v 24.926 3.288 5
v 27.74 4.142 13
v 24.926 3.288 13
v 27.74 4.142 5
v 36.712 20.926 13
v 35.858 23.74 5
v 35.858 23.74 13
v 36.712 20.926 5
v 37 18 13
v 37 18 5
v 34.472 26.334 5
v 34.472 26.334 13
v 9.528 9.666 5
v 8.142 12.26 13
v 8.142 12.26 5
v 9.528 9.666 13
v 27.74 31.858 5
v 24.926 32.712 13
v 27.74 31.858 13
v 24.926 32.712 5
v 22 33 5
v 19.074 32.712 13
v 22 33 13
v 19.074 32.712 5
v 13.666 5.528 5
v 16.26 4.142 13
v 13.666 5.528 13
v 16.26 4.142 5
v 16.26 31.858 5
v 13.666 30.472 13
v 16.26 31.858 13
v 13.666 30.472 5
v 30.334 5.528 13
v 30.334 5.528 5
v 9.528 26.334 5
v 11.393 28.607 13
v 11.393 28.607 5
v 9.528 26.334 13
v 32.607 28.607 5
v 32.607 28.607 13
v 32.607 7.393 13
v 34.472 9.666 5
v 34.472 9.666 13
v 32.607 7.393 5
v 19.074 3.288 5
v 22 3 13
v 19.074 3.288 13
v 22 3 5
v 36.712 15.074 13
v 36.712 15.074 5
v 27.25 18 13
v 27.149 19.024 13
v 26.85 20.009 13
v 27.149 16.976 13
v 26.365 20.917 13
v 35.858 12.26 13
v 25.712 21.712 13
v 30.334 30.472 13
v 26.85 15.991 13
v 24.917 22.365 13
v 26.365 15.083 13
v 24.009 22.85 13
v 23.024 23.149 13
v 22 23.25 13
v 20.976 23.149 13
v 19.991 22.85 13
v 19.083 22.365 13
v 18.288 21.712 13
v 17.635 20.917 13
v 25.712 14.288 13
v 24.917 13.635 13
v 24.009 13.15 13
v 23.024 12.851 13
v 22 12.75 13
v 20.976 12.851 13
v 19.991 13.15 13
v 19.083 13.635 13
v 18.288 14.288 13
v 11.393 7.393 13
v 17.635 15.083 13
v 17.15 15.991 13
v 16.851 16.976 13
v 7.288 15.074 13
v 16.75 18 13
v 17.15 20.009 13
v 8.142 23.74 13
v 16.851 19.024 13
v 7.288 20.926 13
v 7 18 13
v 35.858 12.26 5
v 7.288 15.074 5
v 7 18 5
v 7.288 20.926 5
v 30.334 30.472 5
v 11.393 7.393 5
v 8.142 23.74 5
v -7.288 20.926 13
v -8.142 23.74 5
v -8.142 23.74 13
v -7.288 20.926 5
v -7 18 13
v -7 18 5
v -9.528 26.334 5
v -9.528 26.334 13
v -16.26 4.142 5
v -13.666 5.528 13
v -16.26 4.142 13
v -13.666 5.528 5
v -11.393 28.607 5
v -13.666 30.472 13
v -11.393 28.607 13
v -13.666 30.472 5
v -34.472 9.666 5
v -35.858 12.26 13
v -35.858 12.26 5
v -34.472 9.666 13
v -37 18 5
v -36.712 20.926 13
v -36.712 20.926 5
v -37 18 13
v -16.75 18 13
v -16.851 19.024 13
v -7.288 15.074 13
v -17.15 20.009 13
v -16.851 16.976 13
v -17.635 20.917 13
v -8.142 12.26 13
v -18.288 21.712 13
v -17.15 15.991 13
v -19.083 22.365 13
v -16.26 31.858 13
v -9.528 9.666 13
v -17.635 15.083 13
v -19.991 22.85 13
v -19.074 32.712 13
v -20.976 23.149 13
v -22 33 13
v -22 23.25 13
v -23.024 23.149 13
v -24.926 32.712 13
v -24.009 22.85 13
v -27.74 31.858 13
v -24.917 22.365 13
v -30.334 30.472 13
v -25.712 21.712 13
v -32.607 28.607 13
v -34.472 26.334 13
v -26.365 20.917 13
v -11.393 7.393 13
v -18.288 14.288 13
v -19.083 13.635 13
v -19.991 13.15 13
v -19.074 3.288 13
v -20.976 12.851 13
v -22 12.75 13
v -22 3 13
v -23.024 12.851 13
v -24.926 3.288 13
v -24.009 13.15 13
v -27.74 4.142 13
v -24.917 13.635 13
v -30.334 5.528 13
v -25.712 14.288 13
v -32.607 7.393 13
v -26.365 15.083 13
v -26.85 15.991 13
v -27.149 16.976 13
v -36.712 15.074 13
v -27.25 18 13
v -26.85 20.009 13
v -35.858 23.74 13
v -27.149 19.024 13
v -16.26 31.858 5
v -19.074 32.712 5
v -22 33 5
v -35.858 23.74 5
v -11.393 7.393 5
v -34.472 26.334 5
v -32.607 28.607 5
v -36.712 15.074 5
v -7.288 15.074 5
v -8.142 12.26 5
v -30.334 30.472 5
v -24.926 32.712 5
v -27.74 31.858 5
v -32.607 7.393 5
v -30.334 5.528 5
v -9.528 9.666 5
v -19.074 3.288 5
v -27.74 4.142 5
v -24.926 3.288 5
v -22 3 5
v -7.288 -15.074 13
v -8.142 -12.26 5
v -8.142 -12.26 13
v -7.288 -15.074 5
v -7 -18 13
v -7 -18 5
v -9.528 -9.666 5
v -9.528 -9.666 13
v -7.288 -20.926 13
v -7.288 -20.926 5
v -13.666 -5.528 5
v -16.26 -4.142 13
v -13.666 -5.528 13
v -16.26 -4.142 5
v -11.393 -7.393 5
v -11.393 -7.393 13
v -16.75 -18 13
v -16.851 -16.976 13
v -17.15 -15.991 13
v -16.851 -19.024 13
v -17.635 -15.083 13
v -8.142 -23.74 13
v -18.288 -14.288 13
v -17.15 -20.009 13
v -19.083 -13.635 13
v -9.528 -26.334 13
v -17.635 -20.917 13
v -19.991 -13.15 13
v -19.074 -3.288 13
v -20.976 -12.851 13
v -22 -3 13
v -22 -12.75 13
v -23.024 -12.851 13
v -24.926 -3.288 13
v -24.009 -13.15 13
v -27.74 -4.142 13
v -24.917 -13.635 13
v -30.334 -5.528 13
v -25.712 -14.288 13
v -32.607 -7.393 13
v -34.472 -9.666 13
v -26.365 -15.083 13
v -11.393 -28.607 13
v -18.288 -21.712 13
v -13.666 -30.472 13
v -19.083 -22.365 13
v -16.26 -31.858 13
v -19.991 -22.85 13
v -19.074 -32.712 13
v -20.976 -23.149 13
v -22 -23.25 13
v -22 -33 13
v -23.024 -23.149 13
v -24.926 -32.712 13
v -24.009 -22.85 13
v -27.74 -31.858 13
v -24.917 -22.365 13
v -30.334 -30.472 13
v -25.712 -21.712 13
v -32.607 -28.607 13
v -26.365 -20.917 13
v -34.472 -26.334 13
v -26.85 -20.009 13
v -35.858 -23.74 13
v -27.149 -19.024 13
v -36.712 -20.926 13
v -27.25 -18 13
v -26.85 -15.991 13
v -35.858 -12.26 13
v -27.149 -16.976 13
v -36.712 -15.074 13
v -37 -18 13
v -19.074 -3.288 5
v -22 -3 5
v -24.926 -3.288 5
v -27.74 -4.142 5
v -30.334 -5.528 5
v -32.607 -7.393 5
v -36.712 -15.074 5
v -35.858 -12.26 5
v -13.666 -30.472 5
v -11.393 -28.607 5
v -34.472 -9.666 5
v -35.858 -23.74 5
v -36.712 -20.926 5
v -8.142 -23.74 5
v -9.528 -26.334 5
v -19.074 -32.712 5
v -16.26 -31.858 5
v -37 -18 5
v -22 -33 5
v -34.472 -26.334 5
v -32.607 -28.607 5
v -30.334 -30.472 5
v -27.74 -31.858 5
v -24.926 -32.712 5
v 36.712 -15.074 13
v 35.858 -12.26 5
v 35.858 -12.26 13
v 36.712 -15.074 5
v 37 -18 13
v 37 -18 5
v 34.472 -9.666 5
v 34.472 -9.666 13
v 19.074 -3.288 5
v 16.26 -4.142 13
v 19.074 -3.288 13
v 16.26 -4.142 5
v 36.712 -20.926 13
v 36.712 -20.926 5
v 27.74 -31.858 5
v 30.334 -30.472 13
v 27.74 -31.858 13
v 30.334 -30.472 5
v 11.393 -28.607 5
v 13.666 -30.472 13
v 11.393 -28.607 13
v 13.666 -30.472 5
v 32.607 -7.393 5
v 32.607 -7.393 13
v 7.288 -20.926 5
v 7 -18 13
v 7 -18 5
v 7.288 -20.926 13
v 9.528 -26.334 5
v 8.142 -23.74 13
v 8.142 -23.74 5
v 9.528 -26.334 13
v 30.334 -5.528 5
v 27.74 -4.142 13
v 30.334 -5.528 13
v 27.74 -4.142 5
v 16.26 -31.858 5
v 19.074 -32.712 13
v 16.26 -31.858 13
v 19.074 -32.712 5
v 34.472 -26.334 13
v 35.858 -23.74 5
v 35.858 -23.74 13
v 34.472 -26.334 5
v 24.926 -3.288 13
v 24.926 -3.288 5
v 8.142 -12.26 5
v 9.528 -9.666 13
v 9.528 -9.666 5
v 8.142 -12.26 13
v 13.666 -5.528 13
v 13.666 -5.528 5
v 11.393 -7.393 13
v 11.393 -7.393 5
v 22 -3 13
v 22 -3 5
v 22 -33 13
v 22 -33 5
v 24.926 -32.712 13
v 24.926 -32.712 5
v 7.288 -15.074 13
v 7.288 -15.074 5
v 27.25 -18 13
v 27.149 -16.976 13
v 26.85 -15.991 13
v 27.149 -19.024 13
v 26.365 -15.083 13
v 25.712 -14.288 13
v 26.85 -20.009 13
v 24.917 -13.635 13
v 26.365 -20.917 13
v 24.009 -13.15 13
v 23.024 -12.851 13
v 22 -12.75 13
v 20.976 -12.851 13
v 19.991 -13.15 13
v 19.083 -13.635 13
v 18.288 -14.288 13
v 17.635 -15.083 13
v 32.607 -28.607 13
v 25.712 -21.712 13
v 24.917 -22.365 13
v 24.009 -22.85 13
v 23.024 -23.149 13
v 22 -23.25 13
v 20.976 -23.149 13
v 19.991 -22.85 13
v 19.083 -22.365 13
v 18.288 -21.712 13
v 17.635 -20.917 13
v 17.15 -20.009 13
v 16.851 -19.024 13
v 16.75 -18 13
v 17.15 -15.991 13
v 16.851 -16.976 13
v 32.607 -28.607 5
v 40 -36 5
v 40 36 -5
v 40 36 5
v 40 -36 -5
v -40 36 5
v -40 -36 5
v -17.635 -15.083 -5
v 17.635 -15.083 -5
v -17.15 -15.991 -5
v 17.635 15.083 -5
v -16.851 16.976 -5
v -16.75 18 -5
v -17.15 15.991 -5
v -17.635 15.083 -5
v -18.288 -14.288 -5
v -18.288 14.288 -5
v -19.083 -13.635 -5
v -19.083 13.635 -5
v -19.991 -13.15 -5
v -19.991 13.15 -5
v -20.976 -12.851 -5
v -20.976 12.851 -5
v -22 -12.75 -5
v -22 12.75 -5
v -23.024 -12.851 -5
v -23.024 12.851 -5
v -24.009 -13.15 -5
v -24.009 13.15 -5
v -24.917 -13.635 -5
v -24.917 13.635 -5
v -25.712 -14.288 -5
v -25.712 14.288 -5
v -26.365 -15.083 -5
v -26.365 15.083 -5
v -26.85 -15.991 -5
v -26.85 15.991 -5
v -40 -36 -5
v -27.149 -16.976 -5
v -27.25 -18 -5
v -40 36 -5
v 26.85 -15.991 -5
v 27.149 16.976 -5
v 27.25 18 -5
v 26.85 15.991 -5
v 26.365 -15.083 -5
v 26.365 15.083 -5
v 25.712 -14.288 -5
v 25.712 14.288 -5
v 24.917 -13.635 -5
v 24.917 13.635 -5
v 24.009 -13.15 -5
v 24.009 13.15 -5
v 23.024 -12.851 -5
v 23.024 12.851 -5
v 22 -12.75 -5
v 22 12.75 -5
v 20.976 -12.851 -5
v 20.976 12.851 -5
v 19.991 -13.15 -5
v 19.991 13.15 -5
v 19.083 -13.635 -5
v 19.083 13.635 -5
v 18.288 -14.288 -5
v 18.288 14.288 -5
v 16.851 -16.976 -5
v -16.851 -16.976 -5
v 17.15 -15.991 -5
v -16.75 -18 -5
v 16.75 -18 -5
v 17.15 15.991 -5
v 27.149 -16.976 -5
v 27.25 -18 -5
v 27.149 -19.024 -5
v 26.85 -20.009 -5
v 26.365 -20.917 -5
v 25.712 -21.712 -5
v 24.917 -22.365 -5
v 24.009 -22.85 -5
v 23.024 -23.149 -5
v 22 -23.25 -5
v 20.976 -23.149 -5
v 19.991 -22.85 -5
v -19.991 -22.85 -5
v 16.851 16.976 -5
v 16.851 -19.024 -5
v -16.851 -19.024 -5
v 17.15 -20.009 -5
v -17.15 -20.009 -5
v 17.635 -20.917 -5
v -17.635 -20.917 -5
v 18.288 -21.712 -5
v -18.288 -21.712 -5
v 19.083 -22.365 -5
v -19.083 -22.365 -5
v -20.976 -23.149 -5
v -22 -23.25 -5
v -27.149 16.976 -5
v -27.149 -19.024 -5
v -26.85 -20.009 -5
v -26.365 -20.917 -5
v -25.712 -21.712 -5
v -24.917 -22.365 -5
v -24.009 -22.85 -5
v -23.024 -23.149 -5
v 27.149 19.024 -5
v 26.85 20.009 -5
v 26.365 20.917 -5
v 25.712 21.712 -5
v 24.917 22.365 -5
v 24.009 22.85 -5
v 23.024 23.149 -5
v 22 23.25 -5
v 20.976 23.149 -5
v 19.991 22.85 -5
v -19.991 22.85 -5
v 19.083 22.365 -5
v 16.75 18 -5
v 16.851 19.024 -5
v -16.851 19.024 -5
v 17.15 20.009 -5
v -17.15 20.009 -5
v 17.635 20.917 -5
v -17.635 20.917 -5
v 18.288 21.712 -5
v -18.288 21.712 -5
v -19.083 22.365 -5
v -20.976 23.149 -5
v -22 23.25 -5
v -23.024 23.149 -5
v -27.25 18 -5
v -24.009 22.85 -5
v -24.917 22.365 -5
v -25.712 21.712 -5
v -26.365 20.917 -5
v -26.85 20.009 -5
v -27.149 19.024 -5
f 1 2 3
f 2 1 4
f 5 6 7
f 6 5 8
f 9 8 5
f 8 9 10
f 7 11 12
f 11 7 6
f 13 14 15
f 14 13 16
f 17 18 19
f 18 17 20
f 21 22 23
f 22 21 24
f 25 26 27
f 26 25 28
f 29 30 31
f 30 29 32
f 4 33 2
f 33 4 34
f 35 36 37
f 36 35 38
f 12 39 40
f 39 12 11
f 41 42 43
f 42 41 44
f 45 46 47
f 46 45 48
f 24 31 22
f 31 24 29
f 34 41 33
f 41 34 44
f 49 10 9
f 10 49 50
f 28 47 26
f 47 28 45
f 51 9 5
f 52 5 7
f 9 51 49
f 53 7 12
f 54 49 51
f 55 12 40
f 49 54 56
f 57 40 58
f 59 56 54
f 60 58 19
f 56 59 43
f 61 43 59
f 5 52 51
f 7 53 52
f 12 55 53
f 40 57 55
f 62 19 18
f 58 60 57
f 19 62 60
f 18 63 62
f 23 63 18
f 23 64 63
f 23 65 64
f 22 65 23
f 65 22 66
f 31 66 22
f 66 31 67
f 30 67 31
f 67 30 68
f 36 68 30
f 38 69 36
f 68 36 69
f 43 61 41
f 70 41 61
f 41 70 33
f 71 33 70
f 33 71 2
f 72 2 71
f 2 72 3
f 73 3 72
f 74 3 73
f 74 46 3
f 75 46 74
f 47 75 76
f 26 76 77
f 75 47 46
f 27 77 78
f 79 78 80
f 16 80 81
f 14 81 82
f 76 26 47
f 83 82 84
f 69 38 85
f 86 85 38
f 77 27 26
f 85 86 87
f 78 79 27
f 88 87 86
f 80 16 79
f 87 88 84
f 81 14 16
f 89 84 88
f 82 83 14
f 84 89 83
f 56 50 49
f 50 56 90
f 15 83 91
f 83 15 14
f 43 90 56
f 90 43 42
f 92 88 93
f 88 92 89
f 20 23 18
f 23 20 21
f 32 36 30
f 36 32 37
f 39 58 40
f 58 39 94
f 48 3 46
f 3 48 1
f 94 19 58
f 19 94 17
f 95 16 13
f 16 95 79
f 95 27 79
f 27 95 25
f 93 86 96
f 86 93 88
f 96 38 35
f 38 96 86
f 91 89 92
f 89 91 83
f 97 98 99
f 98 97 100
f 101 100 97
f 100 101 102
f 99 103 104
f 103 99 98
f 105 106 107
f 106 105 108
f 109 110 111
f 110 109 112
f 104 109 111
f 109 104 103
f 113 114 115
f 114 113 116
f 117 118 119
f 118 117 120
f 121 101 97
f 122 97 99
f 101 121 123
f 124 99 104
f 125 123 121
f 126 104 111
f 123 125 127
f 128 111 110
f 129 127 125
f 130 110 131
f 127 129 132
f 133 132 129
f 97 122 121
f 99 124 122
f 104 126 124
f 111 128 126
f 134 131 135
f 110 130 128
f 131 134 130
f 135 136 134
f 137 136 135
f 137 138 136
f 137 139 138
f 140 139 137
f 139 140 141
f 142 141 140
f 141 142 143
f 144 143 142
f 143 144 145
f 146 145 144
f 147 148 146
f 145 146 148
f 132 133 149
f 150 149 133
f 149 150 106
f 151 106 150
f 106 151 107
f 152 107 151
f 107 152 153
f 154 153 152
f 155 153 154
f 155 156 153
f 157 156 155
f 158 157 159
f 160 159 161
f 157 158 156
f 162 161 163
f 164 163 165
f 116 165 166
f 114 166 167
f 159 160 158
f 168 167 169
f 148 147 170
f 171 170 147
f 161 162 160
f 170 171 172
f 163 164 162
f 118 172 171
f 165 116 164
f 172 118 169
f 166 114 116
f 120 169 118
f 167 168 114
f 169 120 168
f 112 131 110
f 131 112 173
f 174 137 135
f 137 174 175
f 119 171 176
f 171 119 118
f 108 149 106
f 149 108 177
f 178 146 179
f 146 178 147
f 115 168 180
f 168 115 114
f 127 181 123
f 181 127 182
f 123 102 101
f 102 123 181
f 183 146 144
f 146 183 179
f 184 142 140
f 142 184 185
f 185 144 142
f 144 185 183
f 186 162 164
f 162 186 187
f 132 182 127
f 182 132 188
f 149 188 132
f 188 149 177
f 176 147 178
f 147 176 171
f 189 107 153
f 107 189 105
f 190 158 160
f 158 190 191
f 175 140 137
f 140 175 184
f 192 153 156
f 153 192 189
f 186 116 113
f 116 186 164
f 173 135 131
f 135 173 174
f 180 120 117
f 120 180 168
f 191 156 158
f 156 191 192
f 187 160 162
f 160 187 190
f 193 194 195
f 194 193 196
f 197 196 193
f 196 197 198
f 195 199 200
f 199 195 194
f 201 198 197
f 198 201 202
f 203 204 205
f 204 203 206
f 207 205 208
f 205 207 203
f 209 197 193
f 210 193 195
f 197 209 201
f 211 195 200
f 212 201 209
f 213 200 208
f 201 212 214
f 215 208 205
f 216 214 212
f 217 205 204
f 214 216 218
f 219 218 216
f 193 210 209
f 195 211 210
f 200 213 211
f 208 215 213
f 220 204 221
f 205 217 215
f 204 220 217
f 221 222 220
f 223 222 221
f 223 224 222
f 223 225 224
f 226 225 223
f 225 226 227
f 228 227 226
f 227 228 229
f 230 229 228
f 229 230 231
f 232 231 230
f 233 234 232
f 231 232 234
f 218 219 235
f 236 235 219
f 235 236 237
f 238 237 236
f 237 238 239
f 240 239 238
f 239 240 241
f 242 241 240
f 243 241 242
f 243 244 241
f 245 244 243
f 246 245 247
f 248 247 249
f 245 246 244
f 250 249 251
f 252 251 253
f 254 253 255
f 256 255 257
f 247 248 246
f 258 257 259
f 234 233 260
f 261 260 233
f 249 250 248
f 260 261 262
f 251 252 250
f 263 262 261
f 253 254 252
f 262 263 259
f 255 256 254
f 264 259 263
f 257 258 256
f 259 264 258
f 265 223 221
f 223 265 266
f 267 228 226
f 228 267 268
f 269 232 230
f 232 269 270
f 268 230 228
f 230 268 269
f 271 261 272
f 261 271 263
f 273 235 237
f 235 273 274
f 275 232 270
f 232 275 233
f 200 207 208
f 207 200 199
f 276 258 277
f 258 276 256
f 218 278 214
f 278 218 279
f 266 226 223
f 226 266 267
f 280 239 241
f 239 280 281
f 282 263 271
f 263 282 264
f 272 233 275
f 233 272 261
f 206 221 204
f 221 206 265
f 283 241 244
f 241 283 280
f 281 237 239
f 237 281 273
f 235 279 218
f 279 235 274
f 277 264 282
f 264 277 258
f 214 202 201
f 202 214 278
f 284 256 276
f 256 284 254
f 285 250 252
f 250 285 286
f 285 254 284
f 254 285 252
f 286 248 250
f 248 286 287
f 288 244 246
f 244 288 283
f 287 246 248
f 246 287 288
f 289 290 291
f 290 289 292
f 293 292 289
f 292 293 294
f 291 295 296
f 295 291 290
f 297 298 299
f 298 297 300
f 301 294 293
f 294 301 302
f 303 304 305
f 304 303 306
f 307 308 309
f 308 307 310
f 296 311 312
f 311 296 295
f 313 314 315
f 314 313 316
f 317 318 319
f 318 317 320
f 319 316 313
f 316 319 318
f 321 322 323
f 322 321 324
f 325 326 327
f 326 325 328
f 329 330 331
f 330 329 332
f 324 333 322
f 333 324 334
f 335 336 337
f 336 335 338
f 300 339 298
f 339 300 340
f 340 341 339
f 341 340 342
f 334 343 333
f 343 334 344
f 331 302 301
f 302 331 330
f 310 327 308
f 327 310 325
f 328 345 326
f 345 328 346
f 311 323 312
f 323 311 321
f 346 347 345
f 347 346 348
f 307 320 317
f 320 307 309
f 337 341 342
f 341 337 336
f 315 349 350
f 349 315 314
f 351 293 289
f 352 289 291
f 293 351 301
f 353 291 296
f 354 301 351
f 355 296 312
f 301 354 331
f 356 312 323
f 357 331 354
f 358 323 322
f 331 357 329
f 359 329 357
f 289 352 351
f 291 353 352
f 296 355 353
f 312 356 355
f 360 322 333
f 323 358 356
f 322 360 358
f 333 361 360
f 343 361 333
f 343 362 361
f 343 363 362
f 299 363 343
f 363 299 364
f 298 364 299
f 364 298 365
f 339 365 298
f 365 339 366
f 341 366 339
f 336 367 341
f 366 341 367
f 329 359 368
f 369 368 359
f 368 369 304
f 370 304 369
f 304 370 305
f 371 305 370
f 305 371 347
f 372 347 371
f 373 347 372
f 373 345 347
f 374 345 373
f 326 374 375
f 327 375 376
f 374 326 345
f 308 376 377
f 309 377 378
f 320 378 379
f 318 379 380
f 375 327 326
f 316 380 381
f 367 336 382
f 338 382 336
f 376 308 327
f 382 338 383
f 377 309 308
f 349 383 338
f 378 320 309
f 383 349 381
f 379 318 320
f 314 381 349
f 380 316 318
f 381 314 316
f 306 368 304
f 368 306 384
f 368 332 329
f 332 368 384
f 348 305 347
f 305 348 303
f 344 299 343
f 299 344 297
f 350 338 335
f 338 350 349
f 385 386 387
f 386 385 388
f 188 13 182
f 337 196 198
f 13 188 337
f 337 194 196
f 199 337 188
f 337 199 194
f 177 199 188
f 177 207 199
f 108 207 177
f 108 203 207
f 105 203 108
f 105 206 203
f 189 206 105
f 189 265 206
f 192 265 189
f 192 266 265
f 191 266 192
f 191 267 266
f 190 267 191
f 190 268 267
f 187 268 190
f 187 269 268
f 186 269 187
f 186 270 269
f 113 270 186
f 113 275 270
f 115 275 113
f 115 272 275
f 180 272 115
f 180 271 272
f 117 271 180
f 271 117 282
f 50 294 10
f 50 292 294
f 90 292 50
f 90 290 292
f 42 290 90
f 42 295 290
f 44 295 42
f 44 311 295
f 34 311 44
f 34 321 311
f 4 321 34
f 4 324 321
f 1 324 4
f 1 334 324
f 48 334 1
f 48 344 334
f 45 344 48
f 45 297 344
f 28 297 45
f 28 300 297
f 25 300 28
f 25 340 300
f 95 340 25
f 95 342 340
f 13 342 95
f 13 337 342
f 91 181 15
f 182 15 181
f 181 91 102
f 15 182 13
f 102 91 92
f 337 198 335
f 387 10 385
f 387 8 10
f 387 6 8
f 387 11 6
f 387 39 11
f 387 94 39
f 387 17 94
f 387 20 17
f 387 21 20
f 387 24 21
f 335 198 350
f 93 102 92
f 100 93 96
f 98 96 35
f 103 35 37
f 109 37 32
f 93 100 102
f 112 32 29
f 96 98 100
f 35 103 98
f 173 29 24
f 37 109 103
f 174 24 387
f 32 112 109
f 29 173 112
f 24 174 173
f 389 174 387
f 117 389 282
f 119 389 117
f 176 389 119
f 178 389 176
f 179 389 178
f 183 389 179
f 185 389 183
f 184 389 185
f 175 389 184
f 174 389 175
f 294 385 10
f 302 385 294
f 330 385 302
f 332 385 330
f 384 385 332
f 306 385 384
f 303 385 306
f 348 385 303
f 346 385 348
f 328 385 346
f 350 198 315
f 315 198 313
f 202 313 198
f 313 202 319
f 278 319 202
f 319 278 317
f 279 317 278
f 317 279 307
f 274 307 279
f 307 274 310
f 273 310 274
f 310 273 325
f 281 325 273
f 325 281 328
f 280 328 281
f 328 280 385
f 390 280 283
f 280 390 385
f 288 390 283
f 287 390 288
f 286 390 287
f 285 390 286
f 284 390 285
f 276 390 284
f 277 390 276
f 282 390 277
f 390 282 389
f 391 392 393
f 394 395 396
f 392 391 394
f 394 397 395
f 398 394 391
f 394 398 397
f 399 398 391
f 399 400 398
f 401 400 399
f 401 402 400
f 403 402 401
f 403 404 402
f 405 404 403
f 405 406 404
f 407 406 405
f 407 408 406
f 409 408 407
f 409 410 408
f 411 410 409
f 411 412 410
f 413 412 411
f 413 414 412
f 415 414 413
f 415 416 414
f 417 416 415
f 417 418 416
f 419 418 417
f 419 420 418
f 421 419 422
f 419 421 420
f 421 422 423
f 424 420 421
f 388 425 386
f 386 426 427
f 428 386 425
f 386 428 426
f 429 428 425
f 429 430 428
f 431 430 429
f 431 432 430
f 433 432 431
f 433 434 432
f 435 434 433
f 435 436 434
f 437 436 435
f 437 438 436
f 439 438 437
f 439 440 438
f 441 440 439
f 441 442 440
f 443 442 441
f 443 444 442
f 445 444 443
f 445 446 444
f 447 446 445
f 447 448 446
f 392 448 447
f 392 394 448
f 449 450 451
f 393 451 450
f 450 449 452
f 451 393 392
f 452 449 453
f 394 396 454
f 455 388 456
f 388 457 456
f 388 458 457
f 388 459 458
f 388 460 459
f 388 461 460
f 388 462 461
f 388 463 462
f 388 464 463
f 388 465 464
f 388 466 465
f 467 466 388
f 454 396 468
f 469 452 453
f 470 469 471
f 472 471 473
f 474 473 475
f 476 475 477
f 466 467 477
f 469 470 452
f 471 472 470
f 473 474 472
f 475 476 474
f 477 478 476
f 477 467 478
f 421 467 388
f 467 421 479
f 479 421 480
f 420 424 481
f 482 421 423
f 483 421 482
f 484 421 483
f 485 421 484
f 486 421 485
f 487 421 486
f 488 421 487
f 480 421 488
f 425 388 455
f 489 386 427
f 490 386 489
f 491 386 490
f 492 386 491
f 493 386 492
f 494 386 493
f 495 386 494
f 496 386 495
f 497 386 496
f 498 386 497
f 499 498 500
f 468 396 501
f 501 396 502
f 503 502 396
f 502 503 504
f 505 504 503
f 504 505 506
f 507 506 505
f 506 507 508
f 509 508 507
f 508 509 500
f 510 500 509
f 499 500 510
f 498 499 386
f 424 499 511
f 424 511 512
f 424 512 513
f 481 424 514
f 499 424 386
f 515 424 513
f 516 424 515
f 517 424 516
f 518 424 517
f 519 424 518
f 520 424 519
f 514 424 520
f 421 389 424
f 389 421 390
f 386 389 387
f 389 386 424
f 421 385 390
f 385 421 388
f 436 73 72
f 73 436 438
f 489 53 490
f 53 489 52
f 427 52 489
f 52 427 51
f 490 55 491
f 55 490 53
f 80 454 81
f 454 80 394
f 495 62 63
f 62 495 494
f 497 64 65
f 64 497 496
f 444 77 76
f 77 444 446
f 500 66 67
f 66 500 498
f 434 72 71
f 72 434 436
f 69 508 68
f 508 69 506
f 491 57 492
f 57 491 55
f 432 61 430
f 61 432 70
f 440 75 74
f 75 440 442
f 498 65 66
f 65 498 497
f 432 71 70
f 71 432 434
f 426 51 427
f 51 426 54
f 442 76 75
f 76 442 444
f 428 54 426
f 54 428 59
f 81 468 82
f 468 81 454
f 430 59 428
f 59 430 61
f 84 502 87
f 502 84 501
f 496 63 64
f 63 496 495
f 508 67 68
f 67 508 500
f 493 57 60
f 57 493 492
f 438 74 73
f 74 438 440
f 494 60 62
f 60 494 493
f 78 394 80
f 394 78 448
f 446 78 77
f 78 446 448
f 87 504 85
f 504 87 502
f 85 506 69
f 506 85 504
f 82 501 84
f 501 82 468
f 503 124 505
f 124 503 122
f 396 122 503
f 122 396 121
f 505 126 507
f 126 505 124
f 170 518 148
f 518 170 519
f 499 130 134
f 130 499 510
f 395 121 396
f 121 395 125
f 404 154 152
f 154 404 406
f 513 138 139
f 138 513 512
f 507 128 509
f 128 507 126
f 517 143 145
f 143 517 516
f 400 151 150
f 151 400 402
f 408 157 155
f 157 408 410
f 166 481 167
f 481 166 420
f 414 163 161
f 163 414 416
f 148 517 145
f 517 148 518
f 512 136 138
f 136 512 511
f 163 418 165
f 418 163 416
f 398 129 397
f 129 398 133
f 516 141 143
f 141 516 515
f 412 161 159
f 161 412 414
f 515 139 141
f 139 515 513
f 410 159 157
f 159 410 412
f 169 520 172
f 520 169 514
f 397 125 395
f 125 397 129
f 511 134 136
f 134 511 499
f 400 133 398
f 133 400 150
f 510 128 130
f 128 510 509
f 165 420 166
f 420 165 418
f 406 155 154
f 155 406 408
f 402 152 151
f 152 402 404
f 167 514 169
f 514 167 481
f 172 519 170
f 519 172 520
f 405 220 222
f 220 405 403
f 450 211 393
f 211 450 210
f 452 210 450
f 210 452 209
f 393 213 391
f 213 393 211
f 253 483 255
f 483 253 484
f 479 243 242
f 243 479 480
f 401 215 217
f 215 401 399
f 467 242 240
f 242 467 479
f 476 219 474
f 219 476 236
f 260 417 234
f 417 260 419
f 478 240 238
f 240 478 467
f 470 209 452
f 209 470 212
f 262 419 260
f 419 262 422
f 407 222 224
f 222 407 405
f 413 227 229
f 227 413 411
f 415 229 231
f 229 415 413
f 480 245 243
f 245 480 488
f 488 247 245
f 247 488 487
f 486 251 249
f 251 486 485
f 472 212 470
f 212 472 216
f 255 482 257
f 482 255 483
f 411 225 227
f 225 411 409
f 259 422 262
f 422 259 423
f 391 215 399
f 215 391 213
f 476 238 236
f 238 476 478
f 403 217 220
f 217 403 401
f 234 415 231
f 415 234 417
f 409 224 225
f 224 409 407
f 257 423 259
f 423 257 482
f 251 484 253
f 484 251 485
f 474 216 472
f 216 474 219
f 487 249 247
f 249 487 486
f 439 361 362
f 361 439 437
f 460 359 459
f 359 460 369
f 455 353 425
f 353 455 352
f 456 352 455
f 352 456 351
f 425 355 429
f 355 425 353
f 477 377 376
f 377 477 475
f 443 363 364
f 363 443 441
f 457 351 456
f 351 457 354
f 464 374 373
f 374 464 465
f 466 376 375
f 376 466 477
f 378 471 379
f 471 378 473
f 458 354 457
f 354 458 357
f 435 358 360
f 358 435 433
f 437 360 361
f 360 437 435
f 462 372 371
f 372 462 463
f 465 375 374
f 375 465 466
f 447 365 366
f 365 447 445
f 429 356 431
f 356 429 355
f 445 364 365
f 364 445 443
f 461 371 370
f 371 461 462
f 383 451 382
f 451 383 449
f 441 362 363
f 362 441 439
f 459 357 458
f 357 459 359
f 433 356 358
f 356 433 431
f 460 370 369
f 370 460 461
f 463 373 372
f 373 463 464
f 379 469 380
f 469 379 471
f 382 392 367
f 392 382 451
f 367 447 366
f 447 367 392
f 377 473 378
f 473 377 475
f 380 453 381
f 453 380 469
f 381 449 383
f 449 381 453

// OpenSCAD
$fn = 32;

// ----------------------------------------------------------------------
// Anchor pads 80 x 72 x 18
// four corner bosses with anchor holes
// ----------------------------------------------------------------------

// --- parameters (mm) ---
plate = [80, 72, 10];  // base plate size (x, y, z)
pads = 4;              // boss count, one per corner
edge = 18;             // boss centre offset from the plate edge
boss_d = 30;           // boss diameter
boss_h = 8;            // boss height above the base plate
hole_d = 10.5;         // hole diameter

// --- derived feature positions (mm) ---
height = plate[2] + boss_h;      // = 18   overall height of the part
corner_x = plate[0] / 2 - edge;  // = 22   boss centre X
corner_y = plate[1] / 2 - edge;  // = 18   boss centre Y
feature_centers = [
  [corner_x, corner_y],
  [-corner_x, corner_y],
  [-corner_x, -corner_y],
  [corner_x, -corner_y]
];   // boss centres, anchor holes are drilled there

// base plate, four bosses standing on it, anchor holes all the way through
difference() {
  union() {
    cube(plate, center = true);
    for (centre = feature_centers)
      translate([centre[0], centre[1], plate[2] / 2 - 1])
        cylinder(d = boss_d, h = boss_h + 1);
  }
  for (centre = feature_centers)
    translate([centre[0], centre[1], -height])
      cylinder(d = hole_d, h = 2 * height + 2);  // through boss and plate
}
